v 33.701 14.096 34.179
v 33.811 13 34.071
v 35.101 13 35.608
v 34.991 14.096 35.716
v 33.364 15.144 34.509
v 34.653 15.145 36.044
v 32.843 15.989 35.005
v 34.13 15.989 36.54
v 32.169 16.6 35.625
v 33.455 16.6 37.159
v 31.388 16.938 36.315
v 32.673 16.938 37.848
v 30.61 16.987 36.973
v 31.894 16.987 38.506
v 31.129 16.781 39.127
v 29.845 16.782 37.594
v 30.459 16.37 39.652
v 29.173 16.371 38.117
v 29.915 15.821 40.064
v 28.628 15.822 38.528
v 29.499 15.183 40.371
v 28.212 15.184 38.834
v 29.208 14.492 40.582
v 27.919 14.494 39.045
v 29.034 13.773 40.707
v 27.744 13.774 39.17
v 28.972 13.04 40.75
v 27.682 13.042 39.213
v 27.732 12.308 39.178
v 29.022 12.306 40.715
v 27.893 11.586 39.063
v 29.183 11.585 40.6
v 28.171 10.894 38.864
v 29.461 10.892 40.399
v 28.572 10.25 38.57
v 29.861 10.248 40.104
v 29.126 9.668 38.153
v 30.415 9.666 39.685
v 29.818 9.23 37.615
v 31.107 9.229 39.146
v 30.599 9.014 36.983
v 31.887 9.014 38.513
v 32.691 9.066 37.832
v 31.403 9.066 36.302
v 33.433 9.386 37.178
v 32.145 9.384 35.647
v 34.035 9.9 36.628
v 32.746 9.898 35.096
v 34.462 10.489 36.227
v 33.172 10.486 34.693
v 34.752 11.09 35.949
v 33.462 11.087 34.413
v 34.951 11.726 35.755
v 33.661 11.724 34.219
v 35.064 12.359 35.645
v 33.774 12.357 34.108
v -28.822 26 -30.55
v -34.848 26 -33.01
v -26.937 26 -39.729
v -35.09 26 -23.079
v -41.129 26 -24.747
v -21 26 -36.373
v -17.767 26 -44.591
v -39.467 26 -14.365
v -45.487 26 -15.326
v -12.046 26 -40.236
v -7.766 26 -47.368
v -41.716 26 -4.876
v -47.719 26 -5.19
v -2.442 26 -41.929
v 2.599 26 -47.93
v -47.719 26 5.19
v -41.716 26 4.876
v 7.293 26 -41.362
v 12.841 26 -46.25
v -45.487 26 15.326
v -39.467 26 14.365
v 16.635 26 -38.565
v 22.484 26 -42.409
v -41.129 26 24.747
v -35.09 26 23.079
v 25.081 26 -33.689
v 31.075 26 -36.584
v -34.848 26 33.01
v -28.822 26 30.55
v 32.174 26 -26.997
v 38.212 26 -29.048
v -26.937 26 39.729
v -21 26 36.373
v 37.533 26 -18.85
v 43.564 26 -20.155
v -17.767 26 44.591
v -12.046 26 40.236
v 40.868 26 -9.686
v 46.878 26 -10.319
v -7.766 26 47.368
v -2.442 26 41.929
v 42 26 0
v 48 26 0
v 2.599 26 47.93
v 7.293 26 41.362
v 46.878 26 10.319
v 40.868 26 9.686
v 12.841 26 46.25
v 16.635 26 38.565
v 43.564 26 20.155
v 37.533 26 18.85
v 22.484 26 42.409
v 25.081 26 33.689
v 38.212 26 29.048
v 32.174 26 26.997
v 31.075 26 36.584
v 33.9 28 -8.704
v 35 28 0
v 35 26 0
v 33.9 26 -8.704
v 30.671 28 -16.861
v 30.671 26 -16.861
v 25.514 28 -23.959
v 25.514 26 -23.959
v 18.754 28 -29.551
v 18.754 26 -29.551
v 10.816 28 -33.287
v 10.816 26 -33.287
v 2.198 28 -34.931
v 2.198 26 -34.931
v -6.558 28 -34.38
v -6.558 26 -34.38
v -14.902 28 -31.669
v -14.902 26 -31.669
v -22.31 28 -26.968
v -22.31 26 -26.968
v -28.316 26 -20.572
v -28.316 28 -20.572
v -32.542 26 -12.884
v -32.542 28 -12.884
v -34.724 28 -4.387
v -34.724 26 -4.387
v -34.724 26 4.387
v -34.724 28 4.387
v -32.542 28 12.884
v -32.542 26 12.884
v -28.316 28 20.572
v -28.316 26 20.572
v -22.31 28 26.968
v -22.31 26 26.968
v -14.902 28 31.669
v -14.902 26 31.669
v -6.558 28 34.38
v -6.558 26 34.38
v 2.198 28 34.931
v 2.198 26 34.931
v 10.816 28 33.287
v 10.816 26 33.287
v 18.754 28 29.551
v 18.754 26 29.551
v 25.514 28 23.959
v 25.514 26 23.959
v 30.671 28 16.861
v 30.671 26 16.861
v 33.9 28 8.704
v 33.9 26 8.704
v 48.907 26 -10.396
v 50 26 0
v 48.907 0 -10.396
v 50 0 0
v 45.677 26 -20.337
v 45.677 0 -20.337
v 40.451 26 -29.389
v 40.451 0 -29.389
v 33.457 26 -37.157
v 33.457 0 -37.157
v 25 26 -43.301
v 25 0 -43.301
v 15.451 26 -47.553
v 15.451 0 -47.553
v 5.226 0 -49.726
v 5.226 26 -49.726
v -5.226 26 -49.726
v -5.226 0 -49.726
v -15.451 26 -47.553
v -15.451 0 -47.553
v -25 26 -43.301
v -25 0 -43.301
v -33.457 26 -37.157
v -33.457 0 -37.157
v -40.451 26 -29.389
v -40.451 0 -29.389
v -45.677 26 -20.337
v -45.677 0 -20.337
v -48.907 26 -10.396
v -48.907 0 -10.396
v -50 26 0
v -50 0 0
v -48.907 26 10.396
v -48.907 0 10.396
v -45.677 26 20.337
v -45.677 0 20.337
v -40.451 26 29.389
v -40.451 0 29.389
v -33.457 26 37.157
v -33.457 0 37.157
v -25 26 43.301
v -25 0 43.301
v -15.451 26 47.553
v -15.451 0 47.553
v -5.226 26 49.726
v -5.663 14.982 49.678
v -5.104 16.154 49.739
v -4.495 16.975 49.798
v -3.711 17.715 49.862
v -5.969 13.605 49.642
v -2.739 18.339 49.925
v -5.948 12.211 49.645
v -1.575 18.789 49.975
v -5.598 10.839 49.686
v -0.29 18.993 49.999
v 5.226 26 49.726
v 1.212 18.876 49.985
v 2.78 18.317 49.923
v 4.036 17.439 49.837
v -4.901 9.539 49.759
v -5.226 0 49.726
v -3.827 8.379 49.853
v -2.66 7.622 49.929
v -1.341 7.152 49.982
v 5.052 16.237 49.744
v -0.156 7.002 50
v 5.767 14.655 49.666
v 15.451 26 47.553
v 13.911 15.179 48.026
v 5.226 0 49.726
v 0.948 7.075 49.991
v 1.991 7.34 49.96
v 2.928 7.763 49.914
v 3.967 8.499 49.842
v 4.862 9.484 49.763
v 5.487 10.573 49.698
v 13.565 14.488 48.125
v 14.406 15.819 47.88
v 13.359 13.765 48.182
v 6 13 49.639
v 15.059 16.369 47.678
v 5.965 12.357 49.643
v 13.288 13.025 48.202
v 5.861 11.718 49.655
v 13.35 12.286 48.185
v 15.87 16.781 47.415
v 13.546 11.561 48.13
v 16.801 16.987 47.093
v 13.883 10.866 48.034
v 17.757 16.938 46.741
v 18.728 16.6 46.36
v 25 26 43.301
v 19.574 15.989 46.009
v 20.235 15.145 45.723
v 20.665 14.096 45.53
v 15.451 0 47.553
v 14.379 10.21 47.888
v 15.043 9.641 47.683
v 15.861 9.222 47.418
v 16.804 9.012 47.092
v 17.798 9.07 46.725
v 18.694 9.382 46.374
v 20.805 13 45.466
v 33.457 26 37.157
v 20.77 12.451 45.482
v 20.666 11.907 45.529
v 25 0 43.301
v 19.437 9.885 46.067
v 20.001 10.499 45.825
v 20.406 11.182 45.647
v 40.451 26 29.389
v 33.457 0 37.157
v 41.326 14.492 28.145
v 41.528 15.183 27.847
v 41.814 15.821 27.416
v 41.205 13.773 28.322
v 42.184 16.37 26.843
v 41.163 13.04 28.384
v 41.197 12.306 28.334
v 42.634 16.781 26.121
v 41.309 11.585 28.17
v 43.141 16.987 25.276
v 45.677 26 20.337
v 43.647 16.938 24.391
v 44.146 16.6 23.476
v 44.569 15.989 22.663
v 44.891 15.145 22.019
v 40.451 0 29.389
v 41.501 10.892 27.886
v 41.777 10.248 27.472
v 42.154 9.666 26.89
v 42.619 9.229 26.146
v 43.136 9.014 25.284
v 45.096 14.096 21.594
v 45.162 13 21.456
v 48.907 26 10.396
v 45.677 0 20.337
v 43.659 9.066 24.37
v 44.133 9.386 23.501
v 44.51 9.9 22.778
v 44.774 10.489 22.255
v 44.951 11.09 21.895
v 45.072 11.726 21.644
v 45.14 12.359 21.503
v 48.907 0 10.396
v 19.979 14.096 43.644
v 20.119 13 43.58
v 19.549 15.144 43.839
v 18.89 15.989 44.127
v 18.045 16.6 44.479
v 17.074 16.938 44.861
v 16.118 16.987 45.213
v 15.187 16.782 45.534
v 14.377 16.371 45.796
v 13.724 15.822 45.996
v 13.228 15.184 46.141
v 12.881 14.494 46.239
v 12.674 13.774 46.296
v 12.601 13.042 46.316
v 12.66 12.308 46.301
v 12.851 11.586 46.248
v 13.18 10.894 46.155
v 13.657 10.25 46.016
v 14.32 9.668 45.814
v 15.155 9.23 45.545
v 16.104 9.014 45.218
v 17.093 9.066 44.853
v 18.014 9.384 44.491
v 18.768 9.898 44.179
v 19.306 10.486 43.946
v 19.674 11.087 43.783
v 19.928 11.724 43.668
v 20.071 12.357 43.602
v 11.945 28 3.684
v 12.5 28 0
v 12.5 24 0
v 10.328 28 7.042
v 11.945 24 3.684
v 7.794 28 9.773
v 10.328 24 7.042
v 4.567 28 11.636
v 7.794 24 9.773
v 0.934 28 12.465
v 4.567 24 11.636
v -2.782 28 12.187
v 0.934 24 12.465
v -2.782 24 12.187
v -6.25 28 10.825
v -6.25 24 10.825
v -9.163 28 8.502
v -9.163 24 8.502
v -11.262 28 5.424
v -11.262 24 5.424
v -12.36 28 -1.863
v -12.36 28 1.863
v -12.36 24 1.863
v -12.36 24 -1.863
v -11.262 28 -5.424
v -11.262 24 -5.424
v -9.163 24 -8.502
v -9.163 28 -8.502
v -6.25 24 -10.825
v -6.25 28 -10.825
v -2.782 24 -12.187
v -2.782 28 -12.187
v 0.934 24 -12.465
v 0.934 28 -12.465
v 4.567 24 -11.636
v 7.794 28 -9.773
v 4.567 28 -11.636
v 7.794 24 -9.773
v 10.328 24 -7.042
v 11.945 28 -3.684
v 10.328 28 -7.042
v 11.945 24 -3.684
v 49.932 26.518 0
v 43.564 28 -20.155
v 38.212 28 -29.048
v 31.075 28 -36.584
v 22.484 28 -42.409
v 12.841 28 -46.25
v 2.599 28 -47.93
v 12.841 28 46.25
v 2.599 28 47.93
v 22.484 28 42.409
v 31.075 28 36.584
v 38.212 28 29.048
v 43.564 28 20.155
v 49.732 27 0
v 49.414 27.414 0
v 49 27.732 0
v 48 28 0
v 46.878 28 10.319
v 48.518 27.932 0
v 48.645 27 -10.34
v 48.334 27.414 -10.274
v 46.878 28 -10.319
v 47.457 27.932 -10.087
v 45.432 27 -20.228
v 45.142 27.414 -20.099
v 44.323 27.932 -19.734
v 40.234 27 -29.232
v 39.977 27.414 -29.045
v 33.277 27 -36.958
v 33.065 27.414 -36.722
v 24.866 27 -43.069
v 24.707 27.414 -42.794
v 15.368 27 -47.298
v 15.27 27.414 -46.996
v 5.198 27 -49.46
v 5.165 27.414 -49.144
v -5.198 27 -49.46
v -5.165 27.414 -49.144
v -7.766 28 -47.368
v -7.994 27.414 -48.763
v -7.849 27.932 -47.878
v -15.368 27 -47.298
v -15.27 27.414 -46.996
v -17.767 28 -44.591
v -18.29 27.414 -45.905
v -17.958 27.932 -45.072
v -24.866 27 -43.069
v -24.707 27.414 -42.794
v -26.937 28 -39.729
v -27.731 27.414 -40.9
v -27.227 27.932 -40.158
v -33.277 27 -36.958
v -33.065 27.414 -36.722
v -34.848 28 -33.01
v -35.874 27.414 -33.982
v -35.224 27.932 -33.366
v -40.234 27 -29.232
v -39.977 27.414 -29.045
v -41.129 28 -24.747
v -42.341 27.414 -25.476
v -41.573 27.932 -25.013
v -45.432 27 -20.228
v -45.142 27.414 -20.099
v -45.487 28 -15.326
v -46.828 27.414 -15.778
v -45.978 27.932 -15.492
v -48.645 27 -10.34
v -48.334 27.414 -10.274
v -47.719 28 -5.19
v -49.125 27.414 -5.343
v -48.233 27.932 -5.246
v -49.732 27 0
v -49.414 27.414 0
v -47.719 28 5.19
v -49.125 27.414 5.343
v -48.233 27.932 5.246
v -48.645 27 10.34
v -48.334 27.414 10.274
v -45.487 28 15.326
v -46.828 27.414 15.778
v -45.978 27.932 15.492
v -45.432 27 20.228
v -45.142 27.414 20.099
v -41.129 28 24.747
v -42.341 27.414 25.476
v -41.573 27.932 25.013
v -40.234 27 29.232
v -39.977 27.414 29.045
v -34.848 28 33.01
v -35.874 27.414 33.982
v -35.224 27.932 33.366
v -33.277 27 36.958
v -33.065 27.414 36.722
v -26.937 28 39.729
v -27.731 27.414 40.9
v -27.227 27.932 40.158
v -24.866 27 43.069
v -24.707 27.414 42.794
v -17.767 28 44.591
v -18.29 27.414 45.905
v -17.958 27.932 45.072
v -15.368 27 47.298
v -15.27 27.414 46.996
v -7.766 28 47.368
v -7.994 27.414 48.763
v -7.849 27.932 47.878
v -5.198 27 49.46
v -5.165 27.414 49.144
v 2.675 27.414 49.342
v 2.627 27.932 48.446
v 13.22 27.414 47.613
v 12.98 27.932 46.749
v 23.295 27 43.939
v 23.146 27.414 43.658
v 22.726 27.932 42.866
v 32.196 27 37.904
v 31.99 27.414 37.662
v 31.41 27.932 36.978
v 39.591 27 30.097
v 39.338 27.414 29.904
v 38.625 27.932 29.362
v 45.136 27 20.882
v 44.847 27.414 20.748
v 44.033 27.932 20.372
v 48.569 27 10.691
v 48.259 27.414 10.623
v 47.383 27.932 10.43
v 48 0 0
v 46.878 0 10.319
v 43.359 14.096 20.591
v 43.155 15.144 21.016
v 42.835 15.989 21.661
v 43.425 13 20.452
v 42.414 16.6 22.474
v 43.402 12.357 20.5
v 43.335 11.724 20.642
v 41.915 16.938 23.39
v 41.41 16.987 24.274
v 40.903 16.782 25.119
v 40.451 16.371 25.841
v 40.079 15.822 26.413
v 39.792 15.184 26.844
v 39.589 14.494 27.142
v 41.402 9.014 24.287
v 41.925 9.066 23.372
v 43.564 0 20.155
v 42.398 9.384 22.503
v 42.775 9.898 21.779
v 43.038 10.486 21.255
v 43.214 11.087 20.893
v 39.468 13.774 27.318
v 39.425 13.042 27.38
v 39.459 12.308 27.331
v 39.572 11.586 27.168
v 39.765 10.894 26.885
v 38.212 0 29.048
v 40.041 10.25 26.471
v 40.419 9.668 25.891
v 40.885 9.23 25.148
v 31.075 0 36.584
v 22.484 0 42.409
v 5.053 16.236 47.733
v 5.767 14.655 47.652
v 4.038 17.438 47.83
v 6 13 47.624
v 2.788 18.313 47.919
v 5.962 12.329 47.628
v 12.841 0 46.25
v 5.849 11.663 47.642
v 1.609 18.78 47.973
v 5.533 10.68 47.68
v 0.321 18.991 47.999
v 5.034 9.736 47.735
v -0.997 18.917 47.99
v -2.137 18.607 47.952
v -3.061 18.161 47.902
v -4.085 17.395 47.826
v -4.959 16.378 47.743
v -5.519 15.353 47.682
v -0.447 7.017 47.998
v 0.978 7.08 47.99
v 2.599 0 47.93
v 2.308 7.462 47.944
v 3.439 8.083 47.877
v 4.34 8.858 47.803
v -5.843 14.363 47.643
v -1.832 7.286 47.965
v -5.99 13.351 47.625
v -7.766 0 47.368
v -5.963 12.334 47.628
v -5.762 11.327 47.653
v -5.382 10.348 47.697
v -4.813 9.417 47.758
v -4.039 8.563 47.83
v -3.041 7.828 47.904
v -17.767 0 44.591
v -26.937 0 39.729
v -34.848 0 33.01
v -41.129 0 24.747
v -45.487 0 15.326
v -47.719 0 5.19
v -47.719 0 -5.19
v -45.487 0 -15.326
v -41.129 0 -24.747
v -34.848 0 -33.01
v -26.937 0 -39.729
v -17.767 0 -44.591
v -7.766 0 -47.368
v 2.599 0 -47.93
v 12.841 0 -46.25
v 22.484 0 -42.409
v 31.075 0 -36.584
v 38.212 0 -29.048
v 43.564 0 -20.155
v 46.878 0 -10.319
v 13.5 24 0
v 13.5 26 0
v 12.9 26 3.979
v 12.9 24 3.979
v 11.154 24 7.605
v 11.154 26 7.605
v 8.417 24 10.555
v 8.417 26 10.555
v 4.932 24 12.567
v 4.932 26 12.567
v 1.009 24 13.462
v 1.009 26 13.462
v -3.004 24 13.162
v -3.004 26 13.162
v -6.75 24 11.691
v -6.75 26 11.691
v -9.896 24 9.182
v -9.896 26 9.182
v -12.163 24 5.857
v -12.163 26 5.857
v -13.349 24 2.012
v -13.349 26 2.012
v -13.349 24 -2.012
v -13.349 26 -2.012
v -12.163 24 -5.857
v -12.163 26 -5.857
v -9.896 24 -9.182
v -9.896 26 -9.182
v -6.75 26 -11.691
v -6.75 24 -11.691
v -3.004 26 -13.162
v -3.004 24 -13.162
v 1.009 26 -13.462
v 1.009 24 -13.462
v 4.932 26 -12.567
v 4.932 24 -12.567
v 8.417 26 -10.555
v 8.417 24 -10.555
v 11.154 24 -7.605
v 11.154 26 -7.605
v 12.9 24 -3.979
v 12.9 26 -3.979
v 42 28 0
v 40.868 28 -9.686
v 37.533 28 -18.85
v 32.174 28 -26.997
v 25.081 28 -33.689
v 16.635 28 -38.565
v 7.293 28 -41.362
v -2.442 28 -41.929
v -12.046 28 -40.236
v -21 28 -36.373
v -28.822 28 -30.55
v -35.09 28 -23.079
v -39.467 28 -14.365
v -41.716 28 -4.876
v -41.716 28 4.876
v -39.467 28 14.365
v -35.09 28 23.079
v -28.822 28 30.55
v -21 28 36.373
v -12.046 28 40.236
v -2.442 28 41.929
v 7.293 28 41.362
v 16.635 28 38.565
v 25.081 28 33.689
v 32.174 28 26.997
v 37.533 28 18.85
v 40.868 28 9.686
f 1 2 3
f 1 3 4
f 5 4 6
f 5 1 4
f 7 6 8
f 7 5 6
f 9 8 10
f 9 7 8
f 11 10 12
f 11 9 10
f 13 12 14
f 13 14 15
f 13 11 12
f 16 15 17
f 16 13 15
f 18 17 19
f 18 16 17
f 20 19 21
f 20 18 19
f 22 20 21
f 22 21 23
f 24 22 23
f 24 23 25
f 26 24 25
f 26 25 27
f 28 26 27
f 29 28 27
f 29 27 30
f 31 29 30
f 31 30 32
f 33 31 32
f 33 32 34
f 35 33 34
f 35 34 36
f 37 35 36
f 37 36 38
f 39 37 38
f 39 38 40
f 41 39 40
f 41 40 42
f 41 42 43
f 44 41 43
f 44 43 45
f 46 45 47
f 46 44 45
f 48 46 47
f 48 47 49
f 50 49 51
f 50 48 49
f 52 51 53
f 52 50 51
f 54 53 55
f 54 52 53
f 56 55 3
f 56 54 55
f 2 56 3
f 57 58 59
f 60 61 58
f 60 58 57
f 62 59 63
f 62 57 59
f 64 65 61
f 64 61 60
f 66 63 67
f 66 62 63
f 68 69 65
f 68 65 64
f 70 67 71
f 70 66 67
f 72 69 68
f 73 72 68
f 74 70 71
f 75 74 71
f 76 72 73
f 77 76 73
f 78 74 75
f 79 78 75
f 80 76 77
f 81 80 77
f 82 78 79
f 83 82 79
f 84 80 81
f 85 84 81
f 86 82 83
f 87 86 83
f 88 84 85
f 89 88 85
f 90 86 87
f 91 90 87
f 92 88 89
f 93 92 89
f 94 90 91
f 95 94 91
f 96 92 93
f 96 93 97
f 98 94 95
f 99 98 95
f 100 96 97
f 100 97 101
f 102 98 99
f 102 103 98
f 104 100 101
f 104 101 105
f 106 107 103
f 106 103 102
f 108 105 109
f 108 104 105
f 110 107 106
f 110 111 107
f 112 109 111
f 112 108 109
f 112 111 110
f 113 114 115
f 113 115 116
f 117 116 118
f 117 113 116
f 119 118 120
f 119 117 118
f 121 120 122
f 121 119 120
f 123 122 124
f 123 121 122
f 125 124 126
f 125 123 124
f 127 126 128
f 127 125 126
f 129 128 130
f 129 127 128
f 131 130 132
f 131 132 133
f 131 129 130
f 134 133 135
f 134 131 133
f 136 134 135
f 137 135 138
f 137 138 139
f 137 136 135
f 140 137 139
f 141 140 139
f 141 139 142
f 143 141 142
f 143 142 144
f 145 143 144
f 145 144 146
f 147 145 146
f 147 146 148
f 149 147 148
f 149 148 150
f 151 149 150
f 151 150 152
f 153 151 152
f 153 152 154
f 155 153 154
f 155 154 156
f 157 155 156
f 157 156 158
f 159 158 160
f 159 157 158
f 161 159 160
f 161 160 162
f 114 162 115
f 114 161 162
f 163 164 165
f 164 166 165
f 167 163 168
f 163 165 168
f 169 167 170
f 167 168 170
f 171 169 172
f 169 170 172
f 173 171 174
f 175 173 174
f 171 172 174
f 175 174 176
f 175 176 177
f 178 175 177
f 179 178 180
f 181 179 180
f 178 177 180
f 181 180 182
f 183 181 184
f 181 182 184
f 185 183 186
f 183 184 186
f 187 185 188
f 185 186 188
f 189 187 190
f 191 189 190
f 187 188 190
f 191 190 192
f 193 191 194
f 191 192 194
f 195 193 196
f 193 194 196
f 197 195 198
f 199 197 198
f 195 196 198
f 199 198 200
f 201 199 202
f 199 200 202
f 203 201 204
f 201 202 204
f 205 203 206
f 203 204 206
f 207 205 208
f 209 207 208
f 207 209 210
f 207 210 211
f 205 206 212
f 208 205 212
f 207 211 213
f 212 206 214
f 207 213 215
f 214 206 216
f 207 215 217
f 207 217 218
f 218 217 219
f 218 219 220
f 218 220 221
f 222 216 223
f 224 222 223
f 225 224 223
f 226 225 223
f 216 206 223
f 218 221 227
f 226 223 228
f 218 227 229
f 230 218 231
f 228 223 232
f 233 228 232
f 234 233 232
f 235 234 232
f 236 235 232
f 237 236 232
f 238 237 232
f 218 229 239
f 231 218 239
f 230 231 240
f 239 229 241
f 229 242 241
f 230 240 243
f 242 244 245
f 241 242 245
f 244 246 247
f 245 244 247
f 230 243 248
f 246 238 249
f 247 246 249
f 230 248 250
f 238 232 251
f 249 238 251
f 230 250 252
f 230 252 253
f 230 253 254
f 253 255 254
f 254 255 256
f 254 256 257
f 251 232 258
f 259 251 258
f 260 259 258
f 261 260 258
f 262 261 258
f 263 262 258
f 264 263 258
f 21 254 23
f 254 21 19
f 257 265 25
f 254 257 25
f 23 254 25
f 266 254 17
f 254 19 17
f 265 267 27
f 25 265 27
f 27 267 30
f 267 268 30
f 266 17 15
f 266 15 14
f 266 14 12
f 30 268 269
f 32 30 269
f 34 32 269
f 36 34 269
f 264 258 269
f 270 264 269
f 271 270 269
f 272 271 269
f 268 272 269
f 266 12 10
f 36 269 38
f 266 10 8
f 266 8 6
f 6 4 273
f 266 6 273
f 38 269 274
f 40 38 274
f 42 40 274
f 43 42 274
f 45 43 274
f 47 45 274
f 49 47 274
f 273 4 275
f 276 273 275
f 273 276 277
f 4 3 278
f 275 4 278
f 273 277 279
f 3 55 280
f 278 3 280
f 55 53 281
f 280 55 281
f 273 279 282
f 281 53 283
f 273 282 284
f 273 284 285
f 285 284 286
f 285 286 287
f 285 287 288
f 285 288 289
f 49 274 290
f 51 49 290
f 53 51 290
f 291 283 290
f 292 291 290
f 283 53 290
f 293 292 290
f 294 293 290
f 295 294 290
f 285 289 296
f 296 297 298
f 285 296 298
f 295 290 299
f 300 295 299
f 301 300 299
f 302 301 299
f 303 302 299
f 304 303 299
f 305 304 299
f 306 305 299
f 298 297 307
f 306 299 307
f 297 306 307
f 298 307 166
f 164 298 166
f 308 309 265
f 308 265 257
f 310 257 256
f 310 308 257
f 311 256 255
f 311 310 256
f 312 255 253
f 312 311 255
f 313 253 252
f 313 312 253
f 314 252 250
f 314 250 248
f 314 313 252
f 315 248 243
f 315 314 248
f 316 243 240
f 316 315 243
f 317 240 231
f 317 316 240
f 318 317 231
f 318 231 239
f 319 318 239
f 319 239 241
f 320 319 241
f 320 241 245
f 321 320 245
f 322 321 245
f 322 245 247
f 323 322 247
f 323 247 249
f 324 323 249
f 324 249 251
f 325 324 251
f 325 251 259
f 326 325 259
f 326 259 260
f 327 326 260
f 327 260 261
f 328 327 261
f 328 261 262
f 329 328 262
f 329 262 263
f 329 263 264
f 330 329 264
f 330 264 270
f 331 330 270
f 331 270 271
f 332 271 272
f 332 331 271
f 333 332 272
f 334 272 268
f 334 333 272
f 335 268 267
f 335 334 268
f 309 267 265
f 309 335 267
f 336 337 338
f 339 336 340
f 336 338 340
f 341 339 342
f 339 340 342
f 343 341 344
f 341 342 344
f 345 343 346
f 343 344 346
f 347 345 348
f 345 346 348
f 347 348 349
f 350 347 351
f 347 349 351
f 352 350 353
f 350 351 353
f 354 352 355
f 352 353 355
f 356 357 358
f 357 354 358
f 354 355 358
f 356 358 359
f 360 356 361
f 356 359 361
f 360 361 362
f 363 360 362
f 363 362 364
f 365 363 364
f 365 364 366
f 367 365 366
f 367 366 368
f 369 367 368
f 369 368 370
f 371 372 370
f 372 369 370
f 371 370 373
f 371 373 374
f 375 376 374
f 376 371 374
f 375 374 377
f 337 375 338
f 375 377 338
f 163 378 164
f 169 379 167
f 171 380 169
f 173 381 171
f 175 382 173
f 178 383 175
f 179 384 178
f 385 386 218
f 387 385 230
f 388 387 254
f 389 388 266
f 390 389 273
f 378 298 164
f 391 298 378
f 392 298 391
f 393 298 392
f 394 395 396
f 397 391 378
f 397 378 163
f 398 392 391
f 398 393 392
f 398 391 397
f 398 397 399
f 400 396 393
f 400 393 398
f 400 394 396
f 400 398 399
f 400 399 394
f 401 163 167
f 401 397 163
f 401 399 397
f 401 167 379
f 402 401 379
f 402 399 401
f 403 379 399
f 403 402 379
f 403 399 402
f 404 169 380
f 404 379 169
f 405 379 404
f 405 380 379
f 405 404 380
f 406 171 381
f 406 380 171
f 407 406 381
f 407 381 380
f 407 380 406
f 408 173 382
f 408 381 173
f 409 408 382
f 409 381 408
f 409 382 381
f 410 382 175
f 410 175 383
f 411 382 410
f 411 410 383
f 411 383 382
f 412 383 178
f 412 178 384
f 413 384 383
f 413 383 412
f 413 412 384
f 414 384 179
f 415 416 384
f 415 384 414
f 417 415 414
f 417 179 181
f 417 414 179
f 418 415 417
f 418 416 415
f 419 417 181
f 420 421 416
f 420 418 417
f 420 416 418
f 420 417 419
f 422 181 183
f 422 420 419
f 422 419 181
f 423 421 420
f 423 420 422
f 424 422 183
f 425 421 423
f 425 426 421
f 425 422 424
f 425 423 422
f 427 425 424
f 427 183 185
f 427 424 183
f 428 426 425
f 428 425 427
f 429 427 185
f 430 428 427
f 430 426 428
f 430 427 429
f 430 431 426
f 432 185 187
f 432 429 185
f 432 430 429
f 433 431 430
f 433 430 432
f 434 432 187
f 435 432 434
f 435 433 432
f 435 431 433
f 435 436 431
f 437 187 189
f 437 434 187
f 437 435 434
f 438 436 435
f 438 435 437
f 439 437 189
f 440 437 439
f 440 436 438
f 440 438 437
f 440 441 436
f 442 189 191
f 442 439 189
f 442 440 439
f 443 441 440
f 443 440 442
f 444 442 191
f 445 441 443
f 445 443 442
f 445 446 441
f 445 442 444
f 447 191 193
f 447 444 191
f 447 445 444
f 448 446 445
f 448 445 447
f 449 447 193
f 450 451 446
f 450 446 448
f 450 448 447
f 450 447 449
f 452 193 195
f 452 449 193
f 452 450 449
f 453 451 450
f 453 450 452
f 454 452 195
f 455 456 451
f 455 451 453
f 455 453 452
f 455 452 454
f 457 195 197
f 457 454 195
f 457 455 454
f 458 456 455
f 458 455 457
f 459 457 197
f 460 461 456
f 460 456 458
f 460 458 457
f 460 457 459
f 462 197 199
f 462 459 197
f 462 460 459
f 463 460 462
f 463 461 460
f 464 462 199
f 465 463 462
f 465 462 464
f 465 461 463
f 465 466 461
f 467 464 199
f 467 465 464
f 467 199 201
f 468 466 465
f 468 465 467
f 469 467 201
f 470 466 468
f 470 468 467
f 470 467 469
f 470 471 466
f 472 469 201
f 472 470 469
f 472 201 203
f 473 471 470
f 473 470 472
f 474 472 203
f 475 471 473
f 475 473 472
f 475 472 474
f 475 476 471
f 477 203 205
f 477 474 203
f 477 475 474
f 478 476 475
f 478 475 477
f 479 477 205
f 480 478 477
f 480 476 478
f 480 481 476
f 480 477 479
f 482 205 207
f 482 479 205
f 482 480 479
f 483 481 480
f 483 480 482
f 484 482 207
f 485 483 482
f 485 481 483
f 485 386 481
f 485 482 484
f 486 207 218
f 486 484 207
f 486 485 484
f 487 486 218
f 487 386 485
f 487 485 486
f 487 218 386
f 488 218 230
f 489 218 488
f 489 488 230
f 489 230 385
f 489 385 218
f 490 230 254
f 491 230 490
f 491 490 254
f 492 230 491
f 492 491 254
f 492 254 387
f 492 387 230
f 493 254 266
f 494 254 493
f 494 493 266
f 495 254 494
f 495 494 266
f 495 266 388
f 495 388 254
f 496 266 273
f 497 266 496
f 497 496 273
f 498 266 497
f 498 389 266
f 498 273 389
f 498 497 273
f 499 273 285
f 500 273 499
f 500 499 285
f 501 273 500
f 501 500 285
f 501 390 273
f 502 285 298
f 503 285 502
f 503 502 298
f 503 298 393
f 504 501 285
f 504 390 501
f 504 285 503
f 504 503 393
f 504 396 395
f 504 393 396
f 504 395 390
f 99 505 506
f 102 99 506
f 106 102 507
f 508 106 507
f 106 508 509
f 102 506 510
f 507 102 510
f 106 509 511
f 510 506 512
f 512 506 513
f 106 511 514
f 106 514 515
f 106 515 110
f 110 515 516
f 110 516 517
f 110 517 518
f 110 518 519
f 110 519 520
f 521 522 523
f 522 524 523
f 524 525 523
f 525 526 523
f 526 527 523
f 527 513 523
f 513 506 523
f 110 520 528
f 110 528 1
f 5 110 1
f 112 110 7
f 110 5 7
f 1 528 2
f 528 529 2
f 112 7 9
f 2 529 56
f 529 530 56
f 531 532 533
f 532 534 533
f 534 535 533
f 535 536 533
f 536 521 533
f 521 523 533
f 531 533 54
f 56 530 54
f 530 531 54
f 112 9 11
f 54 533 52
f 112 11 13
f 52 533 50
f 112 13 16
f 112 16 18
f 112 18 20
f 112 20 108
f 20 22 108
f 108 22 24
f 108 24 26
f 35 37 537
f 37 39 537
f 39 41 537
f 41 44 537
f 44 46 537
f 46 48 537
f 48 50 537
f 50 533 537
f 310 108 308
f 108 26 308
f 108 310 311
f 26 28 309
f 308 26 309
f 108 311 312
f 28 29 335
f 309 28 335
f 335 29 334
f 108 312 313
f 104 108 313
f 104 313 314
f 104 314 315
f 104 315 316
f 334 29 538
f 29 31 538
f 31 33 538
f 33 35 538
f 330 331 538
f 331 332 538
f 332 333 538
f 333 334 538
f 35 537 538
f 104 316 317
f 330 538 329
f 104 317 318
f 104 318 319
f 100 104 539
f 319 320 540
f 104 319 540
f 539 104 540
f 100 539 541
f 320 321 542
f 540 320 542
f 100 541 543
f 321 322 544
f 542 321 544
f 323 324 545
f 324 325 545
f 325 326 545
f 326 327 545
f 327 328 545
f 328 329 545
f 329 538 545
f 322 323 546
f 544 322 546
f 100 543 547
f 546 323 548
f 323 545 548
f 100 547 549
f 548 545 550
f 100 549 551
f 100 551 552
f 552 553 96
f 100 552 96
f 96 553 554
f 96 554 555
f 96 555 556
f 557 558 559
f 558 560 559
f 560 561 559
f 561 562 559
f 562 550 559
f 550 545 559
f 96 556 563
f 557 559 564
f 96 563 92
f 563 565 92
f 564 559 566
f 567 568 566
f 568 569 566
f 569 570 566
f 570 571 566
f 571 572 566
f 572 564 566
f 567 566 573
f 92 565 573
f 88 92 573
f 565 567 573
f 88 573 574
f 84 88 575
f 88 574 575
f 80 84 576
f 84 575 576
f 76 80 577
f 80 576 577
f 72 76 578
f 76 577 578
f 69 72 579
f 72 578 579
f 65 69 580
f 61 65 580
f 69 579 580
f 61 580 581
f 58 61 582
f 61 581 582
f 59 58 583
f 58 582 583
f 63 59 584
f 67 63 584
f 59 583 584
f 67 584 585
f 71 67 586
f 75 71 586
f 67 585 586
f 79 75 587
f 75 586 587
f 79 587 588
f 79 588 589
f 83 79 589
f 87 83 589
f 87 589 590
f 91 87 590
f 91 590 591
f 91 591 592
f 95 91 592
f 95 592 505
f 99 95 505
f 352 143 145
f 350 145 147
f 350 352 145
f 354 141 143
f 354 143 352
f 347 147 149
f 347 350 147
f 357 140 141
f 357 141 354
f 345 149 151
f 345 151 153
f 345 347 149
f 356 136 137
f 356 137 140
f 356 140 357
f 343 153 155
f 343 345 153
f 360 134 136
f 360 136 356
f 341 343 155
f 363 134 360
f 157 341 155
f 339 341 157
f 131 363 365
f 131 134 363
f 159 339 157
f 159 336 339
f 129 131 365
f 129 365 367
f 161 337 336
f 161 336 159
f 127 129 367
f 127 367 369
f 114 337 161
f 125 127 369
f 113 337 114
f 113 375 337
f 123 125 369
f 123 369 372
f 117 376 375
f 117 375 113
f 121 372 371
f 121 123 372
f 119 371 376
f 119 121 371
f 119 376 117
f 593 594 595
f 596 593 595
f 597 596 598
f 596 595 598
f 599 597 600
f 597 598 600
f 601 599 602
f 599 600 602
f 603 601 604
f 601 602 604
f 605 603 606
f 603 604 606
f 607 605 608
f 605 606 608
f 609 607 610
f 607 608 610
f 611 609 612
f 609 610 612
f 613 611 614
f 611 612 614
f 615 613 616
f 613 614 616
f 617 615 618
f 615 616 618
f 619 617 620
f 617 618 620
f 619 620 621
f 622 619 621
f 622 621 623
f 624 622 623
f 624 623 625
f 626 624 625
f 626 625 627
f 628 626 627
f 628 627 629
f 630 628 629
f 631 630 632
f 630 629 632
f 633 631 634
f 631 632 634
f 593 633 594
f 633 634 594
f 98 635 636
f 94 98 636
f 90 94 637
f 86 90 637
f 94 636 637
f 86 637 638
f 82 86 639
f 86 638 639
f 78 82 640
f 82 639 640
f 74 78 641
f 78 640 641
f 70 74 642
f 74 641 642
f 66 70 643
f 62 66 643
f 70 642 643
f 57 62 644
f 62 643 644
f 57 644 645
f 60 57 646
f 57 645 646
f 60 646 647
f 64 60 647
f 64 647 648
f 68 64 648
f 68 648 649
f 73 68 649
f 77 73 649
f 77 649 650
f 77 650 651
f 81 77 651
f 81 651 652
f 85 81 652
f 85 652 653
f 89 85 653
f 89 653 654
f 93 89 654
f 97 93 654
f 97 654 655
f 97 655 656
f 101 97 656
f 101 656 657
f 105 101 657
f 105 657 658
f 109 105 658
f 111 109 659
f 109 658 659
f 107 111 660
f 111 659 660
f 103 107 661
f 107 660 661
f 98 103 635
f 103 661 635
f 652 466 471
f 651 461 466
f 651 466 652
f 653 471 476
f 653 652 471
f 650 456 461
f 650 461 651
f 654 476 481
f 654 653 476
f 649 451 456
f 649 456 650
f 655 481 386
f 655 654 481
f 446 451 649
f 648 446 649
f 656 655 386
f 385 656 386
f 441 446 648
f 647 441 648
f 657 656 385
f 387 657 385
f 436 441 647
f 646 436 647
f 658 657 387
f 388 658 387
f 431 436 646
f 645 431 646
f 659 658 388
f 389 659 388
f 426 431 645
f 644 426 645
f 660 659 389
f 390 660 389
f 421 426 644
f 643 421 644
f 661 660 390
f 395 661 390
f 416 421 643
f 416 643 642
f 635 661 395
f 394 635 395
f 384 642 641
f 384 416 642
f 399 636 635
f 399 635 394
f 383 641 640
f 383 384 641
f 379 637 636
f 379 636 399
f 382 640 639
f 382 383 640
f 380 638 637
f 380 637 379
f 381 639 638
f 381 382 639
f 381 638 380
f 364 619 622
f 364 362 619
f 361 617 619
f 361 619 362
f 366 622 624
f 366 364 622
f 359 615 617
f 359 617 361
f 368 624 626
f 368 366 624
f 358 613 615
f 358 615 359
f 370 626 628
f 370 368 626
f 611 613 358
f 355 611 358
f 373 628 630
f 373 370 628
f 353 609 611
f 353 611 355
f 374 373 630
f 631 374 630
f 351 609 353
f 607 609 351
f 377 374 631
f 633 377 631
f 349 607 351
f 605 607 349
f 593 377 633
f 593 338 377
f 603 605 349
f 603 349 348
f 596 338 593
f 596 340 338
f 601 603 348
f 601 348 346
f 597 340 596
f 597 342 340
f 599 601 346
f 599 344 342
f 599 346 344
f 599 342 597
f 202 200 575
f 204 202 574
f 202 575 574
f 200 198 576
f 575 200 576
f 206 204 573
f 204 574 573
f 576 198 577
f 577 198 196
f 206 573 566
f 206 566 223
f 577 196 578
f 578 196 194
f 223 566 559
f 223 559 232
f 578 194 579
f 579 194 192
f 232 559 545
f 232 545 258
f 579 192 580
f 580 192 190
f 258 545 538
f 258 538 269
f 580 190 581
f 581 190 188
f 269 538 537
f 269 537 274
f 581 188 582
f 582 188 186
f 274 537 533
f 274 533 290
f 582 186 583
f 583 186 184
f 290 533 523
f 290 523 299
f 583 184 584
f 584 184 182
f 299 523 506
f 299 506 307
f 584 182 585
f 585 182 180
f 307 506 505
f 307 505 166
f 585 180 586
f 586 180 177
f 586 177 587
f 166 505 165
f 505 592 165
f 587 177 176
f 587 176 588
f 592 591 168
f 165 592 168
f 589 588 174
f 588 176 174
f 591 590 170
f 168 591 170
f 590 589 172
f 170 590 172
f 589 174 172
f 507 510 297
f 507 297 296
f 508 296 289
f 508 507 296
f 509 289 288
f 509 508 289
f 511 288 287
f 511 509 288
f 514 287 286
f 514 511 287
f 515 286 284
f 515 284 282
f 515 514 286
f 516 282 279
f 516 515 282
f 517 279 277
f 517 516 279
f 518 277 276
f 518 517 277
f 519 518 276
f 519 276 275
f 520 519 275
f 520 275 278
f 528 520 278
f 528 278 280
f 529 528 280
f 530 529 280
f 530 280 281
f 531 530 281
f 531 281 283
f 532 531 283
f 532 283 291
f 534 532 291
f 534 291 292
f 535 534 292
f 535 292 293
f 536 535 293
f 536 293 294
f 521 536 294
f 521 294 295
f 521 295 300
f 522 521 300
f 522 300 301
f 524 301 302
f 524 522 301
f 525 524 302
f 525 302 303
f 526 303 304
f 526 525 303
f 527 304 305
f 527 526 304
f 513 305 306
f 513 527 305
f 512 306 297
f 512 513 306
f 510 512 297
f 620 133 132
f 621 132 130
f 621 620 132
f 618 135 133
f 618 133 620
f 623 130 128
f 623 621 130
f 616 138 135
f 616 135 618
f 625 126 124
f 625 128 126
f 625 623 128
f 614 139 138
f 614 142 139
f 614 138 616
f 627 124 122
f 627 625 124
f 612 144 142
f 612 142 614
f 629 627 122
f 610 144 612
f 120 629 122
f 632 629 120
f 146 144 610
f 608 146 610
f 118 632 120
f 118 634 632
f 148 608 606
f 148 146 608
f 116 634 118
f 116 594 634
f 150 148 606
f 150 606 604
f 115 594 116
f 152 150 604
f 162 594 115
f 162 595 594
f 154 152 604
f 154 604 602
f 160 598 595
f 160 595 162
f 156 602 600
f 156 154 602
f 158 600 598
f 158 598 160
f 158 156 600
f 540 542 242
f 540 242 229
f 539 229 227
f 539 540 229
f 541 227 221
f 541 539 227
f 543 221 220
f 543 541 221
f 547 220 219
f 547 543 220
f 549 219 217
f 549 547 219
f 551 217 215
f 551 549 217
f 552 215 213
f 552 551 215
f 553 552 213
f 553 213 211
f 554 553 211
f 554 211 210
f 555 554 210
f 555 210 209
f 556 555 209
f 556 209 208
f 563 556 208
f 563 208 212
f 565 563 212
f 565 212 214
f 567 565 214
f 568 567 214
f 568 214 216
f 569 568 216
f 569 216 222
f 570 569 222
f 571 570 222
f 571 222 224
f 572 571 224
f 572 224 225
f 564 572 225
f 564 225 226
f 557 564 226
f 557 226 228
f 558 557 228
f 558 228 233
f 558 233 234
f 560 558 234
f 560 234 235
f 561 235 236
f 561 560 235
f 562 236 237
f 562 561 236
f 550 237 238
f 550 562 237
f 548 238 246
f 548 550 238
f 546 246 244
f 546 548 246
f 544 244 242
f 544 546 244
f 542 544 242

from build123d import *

# Parameters (mm, degrees)
SKETCH1_R           = 50
BOSS_EXTRUDE1_DEPTH = 28
SKETCH3_R           = 48
CUT_EXTRUDE1_DEPTH  = 26
SKETCH4_R           = 42
SKETCH4_R_2         = 35
CUT_EXTRUDE2_DEPTH  = 10
SKETCH5_R           = 12.5
CUT_EXTRUDE3_DEPTH  = 10
FILLET1_R           = 2
SKETCH6_R           = 4
CUT_EXTRUDE4_DEPTH  = 51
CIRPATTERN1_COUNT   = 4
CIRPATTERN1_ANGLE   = 60
SKETCH7_R           = 6
CUT_EXTRUDE5_DEPTH  = 51.000000101
SKETCH8_R           = 13.5
BOSS_EXTRUDE2_DEPTH = 2
SKETCH9_R           = 12.5
CUT_EXTRUDE6_DEPTH  = 5


with BuildPart() as part:
    # Sketch1 → Boss-Extrude1 (new body)
    with BuildSketch(Plane(origin=(0, 0, 0), x_dir=(1, 0, 0), z_dir=(0, 1, 0))):
        Circle(SKETCH1_R)
    extrude(amount=BOSS_EXTRUDE1_DEPTH)

    # Sketch3 → Cut-Extrude1 (cut)
    with BuildSketch(Plane.XZ):
        Circle(SKETCH3_R)
    extrude(amount=-CUT_EXTRUDE1_DEPTH, mode=Mode.SUBTRACT)

    # Sketch4 → Cut-Extrude2 (cut)
    with BuildSketch(Plane(origin=(0, 28, 0), x_dir=(1, 0, 0), z_dir=(0, 1, 0))):
        Circle(SKETCH4_R)
        Circle(SKETCH4_R_2, mode=Mode.SUBTRACT)
    extrude(amount=-CUT_EXTRUDE2_DEPTH, mode=Mode.SUBTRACT)

    # Sketch5 → Cut-Extrude3 (cut)
    with BuildSketch(Plane(origin=(0, 28, 0), x_dir=(1, 0, 0), z_dir=(0, 1, 0))):
        Circle(SKETCH5_R)
    extrude(amount=-CUT_EXTRUDE3_DEPTH, mode=Mode.SUBTRACT)

    # Fillet1
    fillet1_edges = [part.edges().sort_by_distance(p)[0] for p in [
        (-50, 28, 0),
    ]]
    fillet(fillet1_edges, radius=FILLET1_R)

    # Sketch6 → Cut-Extrude4 (cut, through all)
    with BuildSketch(Plane.XY):
        with Locations((0, 13)):
            Circle(SKETCH6_R)
    cut_extrude4 = extrude(amount=CUT_EXTRUDE4_DEPTH, mode=Mode.SUBTRACT)

    # CirPattern1: Cut-Extrude4 ×4 about axis
    cirpattern1_axis = Axis((0, 26, 0), (0, 1, 0))
    for i in range(1, CIRPATTERN1_COUNT):
        add(cut_extrude4.rotate(cirpattern1_axis, i * CIRPATTERN1_ANGLE / (CIRPATTERN1_COUNT - 1)), mode=Mode.SUBTRACT)

    # Sketch7 → Cut-Extrude5 (cut, through all)
    with BuildSketch(Plane.XY):
        with Locations((0, 13)):
            Circle(SKETCH7_R)
    extrude(amount=CUT_EXTRUDE5_DEPTH, mode=Mode.SUBTRACT)

    # Sketch8 → Boss-Extrude2 (add)
    with BuildSketch(Plane.XZ.offset(-26)):
        Circle(SKETCH8_R)
    extrude(amount=BOSS_EXTRUDE2_DEPTH)

    # Sketch9 → Cut-Extrude6 (cut, through all)
    with BuildSketch(Plane.XZ.offset(-24)):
        Circle(SKETCH9_R)
    extrude(amount=-CUT_EXTRUDE6_DEPTH, mode=Mode.SUBTRACT)


solid = part.part
